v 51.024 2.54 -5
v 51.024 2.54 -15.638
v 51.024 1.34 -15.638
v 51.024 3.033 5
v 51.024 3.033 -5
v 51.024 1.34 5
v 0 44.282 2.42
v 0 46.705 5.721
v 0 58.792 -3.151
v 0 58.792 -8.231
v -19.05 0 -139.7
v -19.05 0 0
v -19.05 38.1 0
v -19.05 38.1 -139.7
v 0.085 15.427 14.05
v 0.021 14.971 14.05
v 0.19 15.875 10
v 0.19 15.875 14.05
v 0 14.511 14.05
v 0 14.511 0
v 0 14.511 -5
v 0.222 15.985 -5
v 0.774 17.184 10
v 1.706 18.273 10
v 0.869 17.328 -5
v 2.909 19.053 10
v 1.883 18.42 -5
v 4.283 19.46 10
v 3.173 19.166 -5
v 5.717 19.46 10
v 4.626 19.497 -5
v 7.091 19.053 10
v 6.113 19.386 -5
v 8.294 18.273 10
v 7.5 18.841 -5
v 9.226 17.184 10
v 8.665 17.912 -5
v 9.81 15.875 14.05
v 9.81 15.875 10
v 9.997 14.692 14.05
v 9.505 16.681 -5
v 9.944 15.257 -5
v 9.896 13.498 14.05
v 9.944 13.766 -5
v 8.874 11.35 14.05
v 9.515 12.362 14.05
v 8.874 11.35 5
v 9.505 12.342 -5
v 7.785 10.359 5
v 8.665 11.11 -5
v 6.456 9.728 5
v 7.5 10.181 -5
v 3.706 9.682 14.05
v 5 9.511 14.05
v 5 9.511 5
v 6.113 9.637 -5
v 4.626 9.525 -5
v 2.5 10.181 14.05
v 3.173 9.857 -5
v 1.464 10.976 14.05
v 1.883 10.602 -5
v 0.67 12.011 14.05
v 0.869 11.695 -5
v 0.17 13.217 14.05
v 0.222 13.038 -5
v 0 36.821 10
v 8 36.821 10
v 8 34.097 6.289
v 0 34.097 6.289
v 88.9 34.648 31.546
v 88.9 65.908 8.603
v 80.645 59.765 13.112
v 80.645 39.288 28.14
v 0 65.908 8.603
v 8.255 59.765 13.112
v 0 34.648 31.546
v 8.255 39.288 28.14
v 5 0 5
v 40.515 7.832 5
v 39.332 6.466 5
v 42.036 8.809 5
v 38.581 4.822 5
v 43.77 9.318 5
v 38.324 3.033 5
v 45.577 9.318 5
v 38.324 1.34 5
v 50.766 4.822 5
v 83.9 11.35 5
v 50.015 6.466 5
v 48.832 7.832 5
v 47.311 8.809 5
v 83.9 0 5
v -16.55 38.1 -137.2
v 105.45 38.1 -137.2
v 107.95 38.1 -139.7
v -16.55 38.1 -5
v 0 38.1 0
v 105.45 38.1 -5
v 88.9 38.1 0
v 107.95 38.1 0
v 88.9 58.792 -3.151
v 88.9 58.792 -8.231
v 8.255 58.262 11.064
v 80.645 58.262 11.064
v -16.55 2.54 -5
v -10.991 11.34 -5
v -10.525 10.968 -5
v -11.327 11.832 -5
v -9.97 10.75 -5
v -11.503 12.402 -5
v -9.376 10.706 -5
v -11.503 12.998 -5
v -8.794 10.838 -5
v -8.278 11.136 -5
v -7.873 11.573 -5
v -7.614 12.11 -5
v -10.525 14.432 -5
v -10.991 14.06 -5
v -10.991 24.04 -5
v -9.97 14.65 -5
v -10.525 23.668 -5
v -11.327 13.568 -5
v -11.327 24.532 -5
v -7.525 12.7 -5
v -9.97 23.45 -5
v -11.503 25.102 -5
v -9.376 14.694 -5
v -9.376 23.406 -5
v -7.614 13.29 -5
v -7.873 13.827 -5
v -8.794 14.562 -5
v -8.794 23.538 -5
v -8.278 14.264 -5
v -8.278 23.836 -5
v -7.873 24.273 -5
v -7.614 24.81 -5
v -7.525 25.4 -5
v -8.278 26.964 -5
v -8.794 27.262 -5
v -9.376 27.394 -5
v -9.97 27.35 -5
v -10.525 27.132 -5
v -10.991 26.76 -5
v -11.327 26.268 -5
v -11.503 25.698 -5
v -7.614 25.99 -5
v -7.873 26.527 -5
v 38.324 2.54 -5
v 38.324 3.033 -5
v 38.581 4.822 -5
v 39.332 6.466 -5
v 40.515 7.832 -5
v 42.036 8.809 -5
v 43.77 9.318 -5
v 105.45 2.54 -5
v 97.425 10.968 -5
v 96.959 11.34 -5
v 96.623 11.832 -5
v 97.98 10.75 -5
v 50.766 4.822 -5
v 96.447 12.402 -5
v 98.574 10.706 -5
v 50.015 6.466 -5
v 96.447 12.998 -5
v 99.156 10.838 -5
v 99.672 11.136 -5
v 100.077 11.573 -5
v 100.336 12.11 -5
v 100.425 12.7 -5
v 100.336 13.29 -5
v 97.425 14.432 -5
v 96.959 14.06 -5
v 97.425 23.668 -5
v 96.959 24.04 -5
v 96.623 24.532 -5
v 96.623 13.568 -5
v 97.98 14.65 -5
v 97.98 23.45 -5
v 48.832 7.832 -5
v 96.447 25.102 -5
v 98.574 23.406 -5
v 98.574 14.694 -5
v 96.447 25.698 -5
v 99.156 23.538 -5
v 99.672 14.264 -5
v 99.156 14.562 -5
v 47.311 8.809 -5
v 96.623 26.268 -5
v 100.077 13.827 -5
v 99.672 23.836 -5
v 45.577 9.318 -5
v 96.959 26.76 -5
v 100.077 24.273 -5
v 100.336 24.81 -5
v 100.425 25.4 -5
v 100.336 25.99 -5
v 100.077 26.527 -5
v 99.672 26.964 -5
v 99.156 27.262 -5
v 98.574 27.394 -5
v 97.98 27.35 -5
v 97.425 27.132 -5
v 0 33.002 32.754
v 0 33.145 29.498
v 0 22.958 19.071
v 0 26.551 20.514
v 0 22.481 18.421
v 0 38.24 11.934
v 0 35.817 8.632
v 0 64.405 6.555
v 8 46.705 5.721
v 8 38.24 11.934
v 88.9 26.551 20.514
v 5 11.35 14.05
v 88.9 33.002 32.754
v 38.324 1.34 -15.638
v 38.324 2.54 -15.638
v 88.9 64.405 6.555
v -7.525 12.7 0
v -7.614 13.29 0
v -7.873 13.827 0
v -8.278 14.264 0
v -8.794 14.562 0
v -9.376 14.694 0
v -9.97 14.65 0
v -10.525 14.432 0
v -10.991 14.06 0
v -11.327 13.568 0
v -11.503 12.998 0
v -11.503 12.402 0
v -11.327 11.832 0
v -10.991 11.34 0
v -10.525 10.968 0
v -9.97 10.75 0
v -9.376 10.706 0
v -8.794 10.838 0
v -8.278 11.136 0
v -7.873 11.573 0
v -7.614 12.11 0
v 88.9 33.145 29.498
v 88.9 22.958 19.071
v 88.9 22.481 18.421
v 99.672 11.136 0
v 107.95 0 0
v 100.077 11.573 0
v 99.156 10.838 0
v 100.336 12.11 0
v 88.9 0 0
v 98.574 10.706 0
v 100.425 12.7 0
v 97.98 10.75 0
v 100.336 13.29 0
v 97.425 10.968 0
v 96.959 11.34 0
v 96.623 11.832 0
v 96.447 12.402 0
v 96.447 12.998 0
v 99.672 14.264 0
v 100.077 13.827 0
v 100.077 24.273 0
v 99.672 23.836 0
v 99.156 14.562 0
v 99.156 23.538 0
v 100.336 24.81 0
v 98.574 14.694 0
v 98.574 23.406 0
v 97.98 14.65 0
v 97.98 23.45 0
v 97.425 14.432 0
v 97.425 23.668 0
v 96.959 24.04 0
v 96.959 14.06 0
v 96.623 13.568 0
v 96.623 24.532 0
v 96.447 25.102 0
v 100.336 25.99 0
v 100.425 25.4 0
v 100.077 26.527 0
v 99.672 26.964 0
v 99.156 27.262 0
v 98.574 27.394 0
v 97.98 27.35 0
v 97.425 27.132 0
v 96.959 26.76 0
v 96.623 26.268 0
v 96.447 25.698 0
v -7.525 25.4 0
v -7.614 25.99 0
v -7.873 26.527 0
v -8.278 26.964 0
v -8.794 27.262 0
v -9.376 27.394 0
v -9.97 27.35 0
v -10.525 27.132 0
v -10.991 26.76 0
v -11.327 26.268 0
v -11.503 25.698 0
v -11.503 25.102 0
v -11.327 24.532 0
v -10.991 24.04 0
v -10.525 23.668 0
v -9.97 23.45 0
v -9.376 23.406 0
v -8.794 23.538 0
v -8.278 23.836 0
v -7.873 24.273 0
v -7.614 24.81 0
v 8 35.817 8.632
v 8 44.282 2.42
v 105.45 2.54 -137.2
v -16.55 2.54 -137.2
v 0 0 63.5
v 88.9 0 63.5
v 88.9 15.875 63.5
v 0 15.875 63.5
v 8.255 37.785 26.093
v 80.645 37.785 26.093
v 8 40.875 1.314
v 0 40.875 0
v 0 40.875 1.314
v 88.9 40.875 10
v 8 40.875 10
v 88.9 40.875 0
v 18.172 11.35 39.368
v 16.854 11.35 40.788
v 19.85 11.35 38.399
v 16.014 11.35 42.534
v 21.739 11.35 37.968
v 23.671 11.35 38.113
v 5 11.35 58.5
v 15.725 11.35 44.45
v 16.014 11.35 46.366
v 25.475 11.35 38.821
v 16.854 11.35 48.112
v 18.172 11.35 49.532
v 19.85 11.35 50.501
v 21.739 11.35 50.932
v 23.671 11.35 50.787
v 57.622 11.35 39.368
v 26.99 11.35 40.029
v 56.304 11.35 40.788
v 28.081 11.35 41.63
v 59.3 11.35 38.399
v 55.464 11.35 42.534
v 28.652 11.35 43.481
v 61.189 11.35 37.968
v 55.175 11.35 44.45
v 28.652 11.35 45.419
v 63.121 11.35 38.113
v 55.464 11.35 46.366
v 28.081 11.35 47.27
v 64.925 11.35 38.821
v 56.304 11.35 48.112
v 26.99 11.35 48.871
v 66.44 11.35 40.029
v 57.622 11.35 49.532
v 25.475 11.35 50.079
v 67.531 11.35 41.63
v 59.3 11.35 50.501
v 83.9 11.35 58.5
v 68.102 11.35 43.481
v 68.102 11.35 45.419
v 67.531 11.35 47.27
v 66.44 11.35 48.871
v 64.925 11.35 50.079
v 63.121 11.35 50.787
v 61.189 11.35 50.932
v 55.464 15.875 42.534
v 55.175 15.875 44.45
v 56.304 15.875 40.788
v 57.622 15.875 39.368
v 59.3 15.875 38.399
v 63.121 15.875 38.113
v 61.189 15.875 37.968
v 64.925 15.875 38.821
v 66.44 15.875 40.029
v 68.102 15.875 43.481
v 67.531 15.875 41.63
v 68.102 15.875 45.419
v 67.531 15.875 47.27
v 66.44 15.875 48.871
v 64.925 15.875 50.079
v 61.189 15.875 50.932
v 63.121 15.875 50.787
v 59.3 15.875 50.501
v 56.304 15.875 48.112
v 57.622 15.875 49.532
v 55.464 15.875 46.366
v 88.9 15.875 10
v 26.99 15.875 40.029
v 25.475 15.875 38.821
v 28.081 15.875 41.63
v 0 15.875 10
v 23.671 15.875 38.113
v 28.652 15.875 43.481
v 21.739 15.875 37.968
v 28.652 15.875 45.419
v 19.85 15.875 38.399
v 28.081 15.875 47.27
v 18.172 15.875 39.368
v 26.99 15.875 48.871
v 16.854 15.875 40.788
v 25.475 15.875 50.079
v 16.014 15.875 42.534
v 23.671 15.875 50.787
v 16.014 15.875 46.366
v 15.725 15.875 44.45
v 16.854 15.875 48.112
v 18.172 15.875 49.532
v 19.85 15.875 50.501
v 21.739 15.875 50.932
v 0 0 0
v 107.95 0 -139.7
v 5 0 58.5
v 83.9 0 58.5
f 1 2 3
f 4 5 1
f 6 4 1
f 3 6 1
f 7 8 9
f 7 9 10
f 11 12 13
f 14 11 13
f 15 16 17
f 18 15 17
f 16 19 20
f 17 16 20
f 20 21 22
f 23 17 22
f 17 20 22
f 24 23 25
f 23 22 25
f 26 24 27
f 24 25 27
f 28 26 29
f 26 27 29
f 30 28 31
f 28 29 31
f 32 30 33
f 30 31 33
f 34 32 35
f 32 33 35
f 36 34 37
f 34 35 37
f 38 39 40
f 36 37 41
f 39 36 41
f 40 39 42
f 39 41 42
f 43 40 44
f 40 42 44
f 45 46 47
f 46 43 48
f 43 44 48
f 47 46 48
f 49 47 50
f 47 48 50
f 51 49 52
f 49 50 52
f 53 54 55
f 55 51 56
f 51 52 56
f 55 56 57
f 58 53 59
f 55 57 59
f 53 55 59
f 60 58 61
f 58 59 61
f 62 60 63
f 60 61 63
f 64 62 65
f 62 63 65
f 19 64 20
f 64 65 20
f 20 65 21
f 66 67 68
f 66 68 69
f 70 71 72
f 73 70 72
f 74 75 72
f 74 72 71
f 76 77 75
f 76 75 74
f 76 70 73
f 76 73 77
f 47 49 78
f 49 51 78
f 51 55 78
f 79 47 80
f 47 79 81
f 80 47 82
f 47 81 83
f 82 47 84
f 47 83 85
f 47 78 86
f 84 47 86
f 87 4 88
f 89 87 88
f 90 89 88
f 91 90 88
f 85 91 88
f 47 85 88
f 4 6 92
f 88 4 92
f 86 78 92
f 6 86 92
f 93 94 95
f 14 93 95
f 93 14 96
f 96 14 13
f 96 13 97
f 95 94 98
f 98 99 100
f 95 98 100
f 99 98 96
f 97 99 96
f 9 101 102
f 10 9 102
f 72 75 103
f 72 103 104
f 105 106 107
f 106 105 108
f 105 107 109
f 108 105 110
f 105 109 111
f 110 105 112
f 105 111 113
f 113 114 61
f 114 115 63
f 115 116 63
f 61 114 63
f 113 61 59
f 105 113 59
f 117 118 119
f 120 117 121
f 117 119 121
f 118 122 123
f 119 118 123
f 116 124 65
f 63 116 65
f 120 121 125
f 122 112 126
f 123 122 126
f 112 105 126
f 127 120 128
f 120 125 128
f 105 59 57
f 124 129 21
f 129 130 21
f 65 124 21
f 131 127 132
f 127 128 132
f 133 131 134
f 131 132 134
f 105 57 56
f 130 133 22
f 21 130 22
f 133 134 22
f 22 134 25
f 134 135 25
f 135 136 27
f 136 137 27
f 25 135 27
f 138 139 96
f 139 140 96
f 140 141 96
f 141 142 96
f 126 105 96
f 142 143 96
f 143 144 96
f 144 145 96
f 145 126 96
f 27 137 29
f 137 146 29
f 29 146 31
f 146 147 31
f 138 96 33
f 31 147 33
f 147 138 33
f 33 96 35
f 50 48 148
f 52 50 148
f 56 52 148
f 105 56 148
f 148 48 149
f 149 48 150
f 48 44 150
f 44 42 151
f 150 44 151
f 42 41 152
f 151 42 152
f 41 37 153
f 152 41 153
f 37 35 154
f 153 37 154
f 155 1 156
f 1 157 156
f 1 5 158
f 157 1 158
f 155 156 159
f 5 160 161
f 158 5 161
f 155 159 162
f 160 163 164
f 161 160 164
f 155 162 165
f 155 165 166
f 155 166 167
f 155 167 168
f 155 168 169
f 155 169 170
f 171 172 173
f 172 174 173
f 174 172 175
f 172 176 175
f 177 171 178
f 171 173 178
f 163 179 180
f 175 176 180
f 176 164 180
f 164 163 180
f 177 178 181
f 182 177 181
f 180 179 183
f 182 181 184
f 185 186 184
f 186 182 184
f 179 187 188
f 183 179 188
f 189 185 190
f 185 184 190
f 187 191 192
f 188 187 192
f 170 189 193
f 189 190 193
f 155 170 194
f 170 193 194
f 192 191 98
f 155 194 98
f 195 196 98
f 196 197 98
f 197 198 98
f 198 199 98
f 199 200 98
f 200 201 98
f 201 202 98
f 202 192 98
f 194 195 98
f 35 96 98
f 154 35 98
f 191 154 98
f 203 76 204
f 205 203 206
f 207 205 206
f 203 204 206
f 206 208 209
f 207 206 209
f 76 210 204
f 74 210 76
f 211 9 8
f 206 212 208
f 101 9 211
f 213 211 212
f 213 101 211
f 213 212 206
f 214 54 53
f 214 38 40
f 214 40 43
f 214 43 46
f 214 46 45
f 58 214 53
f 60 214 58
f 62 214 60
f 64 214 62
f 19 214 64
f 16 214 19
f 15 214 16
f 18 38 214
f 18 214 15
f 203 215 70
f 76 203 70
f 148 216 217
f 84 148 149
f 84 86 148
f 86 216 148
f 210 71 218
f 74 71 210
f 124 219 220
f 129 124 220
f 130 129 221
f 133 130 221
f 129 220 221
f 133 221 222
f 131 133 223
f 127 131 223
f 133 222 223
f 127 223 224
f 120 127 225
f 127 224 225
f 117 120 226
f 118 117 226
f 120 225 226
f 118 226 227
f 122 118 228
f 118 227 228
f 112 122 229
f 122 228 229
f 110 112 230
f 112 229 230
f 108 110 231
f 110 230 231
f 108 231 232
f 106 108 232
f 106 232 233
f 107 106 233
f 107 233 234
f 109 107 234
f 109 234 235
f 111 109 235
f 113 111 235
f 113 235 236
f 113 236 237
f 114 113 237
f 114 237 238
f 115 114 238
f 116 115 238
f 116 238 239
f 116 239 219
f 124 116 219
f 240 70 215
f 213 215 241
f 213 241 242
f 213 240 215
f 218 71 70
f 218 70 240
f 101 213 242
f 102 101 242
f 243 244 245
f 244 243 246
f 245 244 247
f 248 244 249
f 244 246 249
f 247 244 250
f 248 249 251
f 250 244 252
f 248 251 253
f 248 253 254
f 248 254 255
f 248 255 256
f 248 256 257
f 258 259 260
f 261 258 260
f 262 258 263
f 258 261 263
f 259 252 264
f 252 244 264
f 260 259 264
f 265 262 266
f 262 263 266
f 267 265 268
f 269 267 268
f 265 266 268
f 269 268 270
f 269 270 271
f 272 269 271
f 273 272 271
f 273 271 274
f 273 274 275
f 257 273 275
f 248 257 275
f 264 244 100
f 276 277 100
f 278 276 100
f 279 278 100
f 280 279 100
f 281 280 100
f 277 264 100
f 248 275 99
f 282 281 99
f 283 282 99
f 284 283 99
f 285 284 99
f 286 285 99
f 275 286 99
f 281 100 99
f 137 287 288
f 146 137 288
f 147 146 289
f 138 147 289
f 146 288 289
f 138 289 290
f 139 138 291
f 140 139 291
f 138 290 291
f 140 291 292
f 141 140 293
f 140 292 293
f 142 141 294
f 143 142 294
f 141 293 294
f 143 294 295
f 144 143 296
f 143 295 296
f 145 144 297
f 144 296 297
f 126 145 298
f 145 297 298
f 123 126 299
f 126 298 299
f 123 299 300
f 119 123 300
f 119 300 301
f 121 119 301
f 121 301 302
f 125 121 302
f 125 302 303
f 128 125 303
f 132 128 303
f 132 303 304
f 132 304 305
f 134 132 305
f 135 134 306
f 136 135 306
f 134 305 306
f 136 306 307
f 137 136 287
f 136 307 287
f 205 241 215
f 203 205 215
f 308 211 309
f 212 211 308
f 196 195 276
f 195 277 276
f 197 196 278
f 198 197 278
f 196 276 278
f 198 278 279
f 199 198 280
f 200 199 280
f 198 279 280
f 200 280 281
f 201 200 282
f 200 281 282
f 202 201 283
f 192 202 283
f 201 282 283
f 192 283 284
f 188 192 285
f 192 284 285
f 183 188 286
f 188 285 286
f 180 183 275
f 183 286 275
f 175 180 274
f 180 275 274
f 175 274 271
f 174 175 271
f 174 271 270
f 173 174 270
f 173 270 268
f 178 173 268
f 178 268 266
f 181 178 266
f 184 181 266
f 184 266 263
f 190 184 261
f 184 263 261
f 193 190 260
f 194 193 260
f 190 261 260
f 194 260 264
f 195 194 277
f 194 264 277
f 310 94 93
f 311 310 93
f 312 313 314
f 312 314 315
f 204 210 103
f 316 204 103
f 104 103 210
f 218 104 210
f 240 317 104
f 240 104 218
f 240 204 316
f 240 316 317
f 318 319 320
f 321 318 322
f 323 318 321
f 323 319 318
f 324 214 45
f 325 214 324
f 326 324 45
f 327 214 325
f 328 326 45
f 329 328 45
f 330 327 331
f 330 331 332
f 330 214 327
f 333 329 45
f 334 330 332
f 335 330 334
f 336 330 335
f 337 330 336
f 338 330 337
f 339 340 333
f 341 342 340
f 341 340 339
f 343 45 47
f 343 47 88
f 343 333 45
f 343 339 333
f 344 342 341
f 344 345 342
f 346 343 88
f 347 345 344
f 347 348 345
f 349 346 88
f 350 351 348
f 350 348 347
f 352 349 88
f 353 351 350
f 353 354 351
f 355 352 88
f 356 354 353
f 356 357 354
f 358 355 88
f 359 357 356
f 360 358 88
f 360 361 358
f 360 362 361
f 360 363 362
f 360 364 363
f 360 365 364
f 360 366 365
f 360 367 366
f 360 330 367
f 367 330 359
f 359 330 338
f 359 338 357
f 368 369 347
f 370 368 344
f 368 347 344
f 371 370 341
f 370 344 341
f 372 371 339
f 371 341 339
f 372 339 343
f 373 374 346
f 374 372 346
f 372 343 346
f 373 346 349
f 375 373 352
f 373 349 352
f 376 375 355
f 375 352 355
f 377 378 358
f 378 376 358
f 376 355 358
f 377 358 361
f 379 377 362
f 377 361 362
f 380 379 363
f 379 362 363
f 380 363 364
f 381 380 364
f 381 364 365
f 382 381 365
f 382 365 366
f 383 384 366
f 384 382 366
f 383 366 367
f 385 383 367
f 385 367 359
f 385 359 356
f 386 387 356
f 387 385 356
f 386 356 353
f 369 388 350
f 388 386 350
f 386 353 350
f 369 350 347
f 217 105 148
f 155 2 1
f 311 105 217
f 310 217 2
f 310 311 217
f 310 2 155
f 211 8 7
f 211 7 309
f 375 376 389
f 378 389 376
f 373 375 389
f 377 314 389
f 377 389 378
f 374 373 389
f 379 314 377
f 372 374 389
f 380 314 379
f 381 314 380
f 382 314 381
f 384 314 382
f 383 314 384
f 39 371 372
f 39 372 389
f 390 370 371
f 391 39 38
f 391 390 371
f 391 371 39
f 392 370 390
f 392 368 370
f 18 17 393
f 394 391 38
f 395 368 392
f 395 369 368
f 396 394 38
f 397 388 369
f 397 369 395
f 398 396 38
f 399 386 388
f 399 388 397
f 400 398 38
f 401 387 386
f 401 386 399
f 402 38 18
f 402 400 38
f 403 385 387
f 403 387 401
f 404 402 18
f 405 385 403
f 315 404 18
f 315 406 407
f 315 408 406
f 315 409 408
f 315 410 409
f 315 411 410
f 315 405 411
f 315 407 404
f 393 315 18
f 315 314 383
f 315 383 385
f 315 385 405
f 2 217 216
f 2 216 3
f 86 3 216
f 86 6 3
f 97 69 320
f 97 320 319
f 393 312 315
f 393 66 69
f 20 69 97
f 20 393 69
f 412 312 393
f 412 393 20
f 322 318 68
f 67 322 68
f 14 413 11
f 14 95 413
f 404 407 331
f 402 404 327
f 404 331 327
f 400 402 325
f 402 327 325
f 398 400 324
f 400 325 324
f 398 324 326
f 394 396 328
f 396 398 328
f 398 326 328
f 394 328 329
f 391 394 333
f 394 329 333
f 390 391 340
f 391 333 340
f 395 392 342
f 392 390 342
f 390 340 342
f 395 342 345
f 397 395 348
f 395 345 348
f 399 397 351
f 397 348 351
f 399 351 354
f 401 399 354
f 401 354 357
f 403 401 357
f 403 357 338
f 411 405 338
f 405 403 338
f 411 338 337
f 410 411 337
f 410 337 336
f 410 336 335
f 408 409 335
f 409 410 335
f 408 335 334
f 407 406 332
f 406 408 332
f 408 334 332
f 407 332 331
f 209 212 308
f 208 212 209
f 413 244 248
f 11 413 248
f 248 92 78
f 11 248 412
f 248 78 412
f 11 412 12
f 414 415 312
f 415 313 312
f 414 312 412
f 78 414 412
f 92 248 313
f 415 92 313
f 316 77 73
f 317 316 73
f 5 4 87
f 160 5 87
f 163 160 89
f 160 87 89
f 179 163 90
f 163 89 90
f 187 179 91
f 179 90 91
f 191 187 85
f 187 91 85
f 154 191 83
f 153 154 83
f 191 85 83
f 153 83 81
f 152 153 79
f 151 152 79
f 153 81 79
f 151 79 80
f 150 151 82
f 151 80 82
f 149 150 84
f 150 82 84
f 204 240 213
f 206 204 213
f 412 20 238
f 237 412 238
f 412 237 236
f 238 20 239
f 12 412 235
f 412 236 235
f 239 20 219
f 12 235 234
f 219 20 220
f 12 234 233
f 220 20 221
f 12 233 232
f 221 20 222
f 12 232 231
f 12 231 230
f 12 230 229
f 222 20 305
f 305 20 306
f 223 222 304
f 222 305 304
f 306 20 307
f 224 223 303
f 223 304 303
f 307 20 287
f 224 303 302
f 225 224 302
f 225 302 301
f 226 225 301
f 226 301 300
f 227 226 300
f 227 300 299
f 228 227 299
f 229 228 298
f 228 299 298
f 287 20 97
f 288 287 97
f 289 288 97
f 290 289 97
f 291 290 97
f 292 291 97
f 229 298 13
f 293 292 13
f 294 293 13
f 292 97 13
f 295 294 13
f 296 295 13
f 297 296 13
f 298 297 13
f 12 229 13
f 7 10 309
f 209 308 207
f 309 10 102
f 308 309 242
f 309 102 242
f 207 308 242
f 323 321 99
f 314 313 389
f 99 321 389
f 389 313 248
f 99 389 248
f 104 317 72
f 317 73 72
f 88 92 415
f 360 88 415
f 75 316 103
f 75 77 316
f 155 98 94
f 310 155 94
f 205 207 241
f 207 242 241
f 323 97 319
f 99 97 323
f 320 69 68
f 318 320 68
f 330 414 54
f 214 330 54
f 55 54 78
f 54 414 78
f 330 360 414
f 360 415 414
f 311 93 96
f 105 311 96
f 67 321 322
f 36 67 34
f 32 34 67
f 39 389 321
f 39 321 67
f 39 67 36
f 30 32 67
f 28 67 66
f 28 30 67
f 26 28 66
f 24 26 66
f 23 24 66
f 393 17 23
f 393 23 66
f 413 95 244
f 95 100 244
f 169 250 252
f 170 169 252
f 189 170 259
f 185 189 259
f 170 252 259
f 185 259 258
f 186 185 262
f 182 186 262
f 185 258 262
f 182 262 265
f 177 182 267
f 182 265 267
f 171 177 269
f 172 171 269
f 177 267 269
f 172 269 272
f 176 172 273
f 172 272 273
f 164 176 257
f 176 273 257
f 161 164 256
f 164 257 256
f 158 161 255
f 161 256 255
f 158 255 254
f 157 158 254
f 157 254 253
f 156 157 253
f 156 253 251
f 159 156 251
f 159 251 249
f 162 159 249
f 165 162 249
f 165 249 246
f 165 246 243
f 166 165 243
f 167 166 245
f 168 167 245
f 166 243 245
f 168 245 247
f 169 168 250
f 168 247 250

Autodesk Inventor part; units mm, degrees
ref_plane "YZ Plane" through (0, 0, 0) normal (1, 0, 0) x (0, 1, 0)
ref_plane "XZ Plane" through (0, 0, 0) normal (0, 1, 0) x (-1, 0, 0)
ref_plane "XY Plane" through (0, 0, 0) normal (0, 0, 1) x (1, 0, 0)
sketch "Sketch1" plane through (0, 0, 0) normal (0, 1, 0) x (-1, 0, 0)
  line L0 (0, 0) -> (-88.9, 0)
  line L1 (-88.9, 0) -> (-88.9, 63.5)
  line L2 (-88.9, 63.5) -> (0, 63.5)
  line L3 (0, 63.5) -> (0, 0)
  circle A0 centre (-61.675, 44.45) radius 6.5
  circle A1 centre (-22.225, 44.45) radius 6.5
  line L4 (-83.9, 59) -> (-5, 59)
  line L5 (-5, 59) -> (-5, 5)
  line L6 (-5, 5) -> (-83.9, 5)
  line L7 (-83.9, 5) -> (-83.9, 59)
  point P0 (-88.9, 31.75)
  dimension "d0" = 88.9
  dimension "d1" = 63.5
  dimension "d2" = 13
  dimension "d3" = 13
  dimension "d5" = 22.225
  dimension "d8" = 5
  dimension "d9" = 5
  dimension "d10" = 5
  dimension "d11" = 4.5
  dimension "d21" = 19.05
  dimension "d22" = 19.05
  dimension "d78" = 22.225
extrude "Extrusion1" add sketch "Sketch1" along normal blind 15.875 contours L0 L1 L2 L3 | L4 L5 L6 L7
sketch "Sketch2" plane through (0, 0, 0) normal (0, -1, 0) x (1, 0, 0)
  line L0 (83.9, 58.5) -> (5, 58.5)
  line L1 (5, 58.5) -> (5, 5)
  line L2 (5, 5) -> (83.9, 5)
  line L3 (83.9, 5) -> (83.9, 58.5)
  line L4 (0, 63.5) -> (88.9, 63.5) projected
  line L5 (88.9, 63.5) -> (0, 63.5)
  line L6 (0, 63.5) -> (0, 0)
  line L7 (0, 0) -> (88.9, 0)
  line L8 (88.9, 0) -> (88.9, 63.5)
  point P0 (88.9, 31.75)
  point P1 (5, 31.75)
  dimension "d12" = 5
  dimension "d13" = 5
  dimension "d14" = 5
  dimension "d15" = 5
extrude "Extrusion2" cut sketch "Sketch2" against normal blind 11.35 contours L3 L2 L1 L0
sketch "Sketch3" plane through (0, 15.875, 0) normal (0, 1, 0) x (1, 0, 0)
  line L0 (88.9, -63.5) -> (88.9, 0) projected
  line L1 (0, 0) -> (88.9, 0)
  line L2 (88.9, 0) -> (88.9, -10)
  line L3 (88.9, -10) -> (0, -10)
  line L4 (0, -10) -> (0, 0)
  dimension "d18" = 10
extrude "Extrusion3" add sketch "Sketch3" along normal blind 25
sketch "Sketch6" plane through (88.9, 0, 0) normal (0, 0, -1) x (-1, 0, 0)
  line L0 (88.9, 0) -> (0, 0)
  line L1 (88.9, 0) -> (88.9, 15.875) projected
  line L2 (0, 0) -> (88.9, 0)
  line L3 (88.9, 0) -> (-38.1, 0)
  line L4 (83.9, 0) -> (5, 0) projected
  line L5 (-19.05, 0) -> (107.95, 0)
  line L6 (107.95, 0) -> (107.95, 38.1)
  line L7 (107.95, 38.1) -> (-19.05, 38.1)
  line L8 (-19.05, 38.1) -> (-19.05, 0)
  circle A0 centre (98.425, 27.2577) radius 2
  circle A1 centre (98.425, 14.4837) radius 2
  line L9 (88.9, 15.875) -> (88.9, 40.875) projected
  line L10 (88.9, 40.875) -> (88.9, 34.3515)
  point P0 (44.45, 0)
  dimension "d32" = 127
  dimension "d33" = 38.1
  dimension "d85" = 4
  dimension "d86" = 4
  dimension "d87" = 9.525
  dimension "d88" = 9.525
extrude "Extrusion6" add sketch "Sketch6" along normal blind 139.7 contours L0 L3 L8 L7 L9 L1 | L1 L9 L7 L6 L5 | A0 | A1
sketch "Sketch7" plane through (-19.05, 38.1, 0) normal (0, 1, 0) x (1, 0, 0)
  line L0 (124.5, 137.2) -> (2.5, 137.2)
  line L1 (2.5, 137.2) -> (2.5, 5)
  line L2 (2.5, 5) -> (124.5, 5)
  line L3 (124.5, 5) -> (124.5, 137.2)
  line L4 (127, 0) -> (127, 139.7) projected
  line L5 (19.05, 0) -> (0, 0) projected
  line L6 (127, 139.7) -> (0, 139.7)
  line L7 (0, 139.7) -> (0, 0)
  line L8 (0, 0) -> (127, 0)
  line L9 (127, 0) -> (127, 139.7)
  dimension "d36" = 2.5
  dimension "d37" = 2.5
  dimension "d38" = 2.5
  dimension "d39" = 5
extrude "Extrusion7" cut sketch "Sketch7" against normal blind 35.56 contours L3 L2 L1 L0
sketch "Sketch8" plane through (88.9, 0, 63.5) normal (1, 0, 0) x (0, 0, -1)
  line L0 (53.5, 40.875) -> (63.5, 40.875) projected
  line L1 (66.6506, 58.7918) -> (40.3494, 22.9582)
  line L2 (66.6506, 58.7918) -> (71.7306, 58.7918)
  line L3 (71.7306, 58.7918) -> (45.0793, 22.4812)
  line L4 (45.0793, 22.4812) -> (44.4294, 22.9582)
  line L5 (45.0793, 22.4812) -> (30.7458, 33.0017)
  line L6 (30.7458, 33.0017) -> (31.9543, 34.6482)
  line L7 (31.9543, 34.6482) -> (46.2878, 24.1277)
  point P0 (63.5, 0)
  point P1 (58.58, 40.875)
  point P2 (42.9864, 26.5509)
  dimension "d46" = 44.45
  dimension "d47" = 5.08
  dimension "d48" = 17.78
extrude "Extrusion8" add sketch "Sketch8" against normal blind 88.9 separate body
sketch "Sketch9" plane through (0, 58.7918, -3.1506) normal (0, 0.5917, 0.8062) x (1, 0, 0)
  point P0 (0, -49.2596)
sketch "Sketch10" plane through (0, 26.5509, 20.5136) normal (0, 0.8062, -0.5917) x (1, 0, 0)
  point P0 (0, 32.2474)
sketch "Sketch11" plane through (0, 26.5509, 20.5136) normal (0, 0.8062, -0.5917) x (1, 0, 0)
  line L0 (88.9, -13.6847) -> (0, -13.6847) projected
  line L1 (0, 4.0953) -> (0, -13.6847) projected
  line L2 (88.9, -13.6847) -> (0, -13.6847)
  line L3 (0, -13.6847) -> (0, -11.1447)
  line L4 (0, -11.1447) -> (88.9, -11.1447)
  line L5 (88.9, -11.1447) -> (88.9, -13.6847)
  point P0 (0, 32.2474)
  dimension "d51" = 2.54
extrude "Extrusion9" add sketch "Sketch11" along normal blind 44.45 bodies 2
sketch "Sketch12" plane through (0, 33.0017, 32.7542) normal (0, 0.5917, 0.8062) x (1, 0, 0)
  point P0 (0, -7.2238)
sketch "Sketch14" plane through (0, 33.0017, 32.7542) normal (0, 0.5917, 0.8062) x (1, 0, 0)
  line L0 (0, -0.3431) -> (0, -31.9992) projected
  line L1 (0, 0.1776) -> (0, 57.5667)
  line L2 (0, 0.1776) -> (88.9, 0.1776)
  line L3 (88.9, -31.9992) -> (88.9, -0.3431) projected
  line L4 (0, 7.7976) -> (110.0789, 7.7976)
  line L5 (88.9, 46.4924) -> (0, 46.4924) projected
  line L6 (88.9, 46.4924) -> (88.9, 0.1776)
  line L7 (80.645, 0.1776) -> (80.645, 46.4924)
  line L8 (88.9, 45.0417) -> (0, 45.0417) projected
  line L9 (0, 46.4924) -> (0, 0.1776)
  line L10 (8.255, 0.1776) -> (8.255, 51.38)
  line L11 (8.255, 33.1976) -> (80.645, 33.1976)
  line L12 (88.9, 40.8176) -> (0, 40.8176)
  point P0 (0, -7.2238)
  point P1 (80.645, 23.335)
  point P2 (0, 28.8721)
  point P3 (0, 40.8176)
  point P4 (8.255, 7.7976)
  point P5 (80.645, 7.7976)
  dimension "d64" = 7.62
  dimension "d65" = 8.255
  dimension "d66" = 8.255
  dimension "d67" = 25.4
  dimension "d68" = 7.62
extrude "Extrusion10" cut sketch "Sketch14" against normal blind 4.7625 contours L1 L8 L10 L12 | L10 L11 L7 L4 | L10 L8 L7 L12 | L7 L8 L6 L12 bodies 2
sketch "Sketch15" plane through (0, 69.3123, 6.1029) normal (0, -0.8062, 0.5917) x (1, 0, 0)
  line L0 (0, -4.4356) -> (91.0407, -4.4356)
  line L1 (91.0407, -4.4356) -> (91.0407, 6.9043)
  line L2 (91.0407, 6.9043) -> (0, 6.9043)
  line L3 (0, 6.9043) -> (0, -4.4356)
  point P0 (0, -45.9321)
extrude "Extrusion11" cut sketch "Sketch15" against normal blind 4.7625 bodies 2
sketch "Sketch16" plane through (105.45, 38.1, -5) normal (0, 0, -1) x (-1, 0, 0)
  circle A0 centre (100.45, -23.5887) radius 5
  point P0 (105.45, -38.1)
  dimension "d73" = 10
extrude "Extrusion12" cut sketch "Sketch16" against normal blind 19.05 bodies 1
sketch "Sketch18" plane through (0, 58.7918, -3.1506) normal (0, 0.5917, 0.8062) x (1, 0, 0)
  line L0 (0, -39.9934) -> (0, 0) projected
  line L1 (0, -39.9934) -> (0, -25.4934)
  line L2 (0, -25.4934) -> (0, -14.9934)
  line L3 (0, -14.9934) -> (8, -14.9934)
  line L4 (8, -14.9934) -> (8, -25.4934)
  line L5 (8, -25.4934) -> (0, -25.4934)
  point P0 (0, -49.2596)
  dimension "d80" = 14.5
  dimension "d81" = 10.5
  dimension "d82" = 8
extrude "Extrusion14" cut sketch "Sketch18" against normal blind 7 bodies 2 1
sketch "Sketch19" plane through (88.9, 0, 0) normal (0, 0, 1) x (1, 0, 0)
  circle A0 centre (-98.425, 25.4) radius 2
  circle A1 centre (-98.425, 12.7) radius 2
  line L0 (-107.95, 0) -> (-107.95, 38.1) projected
  circle A2 centre (9.525, 25.4) radius 2
  circle A3 centre (9.525, 12.7) radius 2
  line L1 (19.05, 38.1) -> (19.05, 0) projected
  line L2 (-107.95, 38.1) -> (19.05, 38.1) projected
  point P0 (-88.9, 0)
  dimension "d89" = 4
  dimension "d90" = 4
  dimension "d91" = 9.525
  dimension "d92" = 9.525
  dimension "d93" = 4
  dimension "d94" = 4
  dimension "d95" = 9.525
  dimension "d96" = 9.525
  dimension "d97" = 12.7
  dimension "d98" = 12.7
  dimension "d99" = 12.7
  dimension "d100" = 12.7
extrude "Extrusion15" cut sketch "Sketch19" against normal blind 19.05 bodies 1
sketch "Sketch20" plane through (5, 0, 5) normal (0, 0, 1) x (1, 0, 0)
  arc A0 (46.0235, 3.0327) -> (33.3235, 3.0327) centre (39.6735, 3.0327) ccw
  line L0 (46.0235, 3.0327) -> (46.0235, 1.34)
  line L1 (46.0235, 1.34) -> (33.3235, 1.34)
  line L2 (33.3235, 1.34) -> (33.3235, 3.0327)
  point P0 (-5, 0)
  dimension "d106" = 12.7
extrude "Extrusion16" cut sketch "Sketch20" against normal blind 20.6375 bodies 1
properties part number "not auger -2.0" material "PBT Plastic"
